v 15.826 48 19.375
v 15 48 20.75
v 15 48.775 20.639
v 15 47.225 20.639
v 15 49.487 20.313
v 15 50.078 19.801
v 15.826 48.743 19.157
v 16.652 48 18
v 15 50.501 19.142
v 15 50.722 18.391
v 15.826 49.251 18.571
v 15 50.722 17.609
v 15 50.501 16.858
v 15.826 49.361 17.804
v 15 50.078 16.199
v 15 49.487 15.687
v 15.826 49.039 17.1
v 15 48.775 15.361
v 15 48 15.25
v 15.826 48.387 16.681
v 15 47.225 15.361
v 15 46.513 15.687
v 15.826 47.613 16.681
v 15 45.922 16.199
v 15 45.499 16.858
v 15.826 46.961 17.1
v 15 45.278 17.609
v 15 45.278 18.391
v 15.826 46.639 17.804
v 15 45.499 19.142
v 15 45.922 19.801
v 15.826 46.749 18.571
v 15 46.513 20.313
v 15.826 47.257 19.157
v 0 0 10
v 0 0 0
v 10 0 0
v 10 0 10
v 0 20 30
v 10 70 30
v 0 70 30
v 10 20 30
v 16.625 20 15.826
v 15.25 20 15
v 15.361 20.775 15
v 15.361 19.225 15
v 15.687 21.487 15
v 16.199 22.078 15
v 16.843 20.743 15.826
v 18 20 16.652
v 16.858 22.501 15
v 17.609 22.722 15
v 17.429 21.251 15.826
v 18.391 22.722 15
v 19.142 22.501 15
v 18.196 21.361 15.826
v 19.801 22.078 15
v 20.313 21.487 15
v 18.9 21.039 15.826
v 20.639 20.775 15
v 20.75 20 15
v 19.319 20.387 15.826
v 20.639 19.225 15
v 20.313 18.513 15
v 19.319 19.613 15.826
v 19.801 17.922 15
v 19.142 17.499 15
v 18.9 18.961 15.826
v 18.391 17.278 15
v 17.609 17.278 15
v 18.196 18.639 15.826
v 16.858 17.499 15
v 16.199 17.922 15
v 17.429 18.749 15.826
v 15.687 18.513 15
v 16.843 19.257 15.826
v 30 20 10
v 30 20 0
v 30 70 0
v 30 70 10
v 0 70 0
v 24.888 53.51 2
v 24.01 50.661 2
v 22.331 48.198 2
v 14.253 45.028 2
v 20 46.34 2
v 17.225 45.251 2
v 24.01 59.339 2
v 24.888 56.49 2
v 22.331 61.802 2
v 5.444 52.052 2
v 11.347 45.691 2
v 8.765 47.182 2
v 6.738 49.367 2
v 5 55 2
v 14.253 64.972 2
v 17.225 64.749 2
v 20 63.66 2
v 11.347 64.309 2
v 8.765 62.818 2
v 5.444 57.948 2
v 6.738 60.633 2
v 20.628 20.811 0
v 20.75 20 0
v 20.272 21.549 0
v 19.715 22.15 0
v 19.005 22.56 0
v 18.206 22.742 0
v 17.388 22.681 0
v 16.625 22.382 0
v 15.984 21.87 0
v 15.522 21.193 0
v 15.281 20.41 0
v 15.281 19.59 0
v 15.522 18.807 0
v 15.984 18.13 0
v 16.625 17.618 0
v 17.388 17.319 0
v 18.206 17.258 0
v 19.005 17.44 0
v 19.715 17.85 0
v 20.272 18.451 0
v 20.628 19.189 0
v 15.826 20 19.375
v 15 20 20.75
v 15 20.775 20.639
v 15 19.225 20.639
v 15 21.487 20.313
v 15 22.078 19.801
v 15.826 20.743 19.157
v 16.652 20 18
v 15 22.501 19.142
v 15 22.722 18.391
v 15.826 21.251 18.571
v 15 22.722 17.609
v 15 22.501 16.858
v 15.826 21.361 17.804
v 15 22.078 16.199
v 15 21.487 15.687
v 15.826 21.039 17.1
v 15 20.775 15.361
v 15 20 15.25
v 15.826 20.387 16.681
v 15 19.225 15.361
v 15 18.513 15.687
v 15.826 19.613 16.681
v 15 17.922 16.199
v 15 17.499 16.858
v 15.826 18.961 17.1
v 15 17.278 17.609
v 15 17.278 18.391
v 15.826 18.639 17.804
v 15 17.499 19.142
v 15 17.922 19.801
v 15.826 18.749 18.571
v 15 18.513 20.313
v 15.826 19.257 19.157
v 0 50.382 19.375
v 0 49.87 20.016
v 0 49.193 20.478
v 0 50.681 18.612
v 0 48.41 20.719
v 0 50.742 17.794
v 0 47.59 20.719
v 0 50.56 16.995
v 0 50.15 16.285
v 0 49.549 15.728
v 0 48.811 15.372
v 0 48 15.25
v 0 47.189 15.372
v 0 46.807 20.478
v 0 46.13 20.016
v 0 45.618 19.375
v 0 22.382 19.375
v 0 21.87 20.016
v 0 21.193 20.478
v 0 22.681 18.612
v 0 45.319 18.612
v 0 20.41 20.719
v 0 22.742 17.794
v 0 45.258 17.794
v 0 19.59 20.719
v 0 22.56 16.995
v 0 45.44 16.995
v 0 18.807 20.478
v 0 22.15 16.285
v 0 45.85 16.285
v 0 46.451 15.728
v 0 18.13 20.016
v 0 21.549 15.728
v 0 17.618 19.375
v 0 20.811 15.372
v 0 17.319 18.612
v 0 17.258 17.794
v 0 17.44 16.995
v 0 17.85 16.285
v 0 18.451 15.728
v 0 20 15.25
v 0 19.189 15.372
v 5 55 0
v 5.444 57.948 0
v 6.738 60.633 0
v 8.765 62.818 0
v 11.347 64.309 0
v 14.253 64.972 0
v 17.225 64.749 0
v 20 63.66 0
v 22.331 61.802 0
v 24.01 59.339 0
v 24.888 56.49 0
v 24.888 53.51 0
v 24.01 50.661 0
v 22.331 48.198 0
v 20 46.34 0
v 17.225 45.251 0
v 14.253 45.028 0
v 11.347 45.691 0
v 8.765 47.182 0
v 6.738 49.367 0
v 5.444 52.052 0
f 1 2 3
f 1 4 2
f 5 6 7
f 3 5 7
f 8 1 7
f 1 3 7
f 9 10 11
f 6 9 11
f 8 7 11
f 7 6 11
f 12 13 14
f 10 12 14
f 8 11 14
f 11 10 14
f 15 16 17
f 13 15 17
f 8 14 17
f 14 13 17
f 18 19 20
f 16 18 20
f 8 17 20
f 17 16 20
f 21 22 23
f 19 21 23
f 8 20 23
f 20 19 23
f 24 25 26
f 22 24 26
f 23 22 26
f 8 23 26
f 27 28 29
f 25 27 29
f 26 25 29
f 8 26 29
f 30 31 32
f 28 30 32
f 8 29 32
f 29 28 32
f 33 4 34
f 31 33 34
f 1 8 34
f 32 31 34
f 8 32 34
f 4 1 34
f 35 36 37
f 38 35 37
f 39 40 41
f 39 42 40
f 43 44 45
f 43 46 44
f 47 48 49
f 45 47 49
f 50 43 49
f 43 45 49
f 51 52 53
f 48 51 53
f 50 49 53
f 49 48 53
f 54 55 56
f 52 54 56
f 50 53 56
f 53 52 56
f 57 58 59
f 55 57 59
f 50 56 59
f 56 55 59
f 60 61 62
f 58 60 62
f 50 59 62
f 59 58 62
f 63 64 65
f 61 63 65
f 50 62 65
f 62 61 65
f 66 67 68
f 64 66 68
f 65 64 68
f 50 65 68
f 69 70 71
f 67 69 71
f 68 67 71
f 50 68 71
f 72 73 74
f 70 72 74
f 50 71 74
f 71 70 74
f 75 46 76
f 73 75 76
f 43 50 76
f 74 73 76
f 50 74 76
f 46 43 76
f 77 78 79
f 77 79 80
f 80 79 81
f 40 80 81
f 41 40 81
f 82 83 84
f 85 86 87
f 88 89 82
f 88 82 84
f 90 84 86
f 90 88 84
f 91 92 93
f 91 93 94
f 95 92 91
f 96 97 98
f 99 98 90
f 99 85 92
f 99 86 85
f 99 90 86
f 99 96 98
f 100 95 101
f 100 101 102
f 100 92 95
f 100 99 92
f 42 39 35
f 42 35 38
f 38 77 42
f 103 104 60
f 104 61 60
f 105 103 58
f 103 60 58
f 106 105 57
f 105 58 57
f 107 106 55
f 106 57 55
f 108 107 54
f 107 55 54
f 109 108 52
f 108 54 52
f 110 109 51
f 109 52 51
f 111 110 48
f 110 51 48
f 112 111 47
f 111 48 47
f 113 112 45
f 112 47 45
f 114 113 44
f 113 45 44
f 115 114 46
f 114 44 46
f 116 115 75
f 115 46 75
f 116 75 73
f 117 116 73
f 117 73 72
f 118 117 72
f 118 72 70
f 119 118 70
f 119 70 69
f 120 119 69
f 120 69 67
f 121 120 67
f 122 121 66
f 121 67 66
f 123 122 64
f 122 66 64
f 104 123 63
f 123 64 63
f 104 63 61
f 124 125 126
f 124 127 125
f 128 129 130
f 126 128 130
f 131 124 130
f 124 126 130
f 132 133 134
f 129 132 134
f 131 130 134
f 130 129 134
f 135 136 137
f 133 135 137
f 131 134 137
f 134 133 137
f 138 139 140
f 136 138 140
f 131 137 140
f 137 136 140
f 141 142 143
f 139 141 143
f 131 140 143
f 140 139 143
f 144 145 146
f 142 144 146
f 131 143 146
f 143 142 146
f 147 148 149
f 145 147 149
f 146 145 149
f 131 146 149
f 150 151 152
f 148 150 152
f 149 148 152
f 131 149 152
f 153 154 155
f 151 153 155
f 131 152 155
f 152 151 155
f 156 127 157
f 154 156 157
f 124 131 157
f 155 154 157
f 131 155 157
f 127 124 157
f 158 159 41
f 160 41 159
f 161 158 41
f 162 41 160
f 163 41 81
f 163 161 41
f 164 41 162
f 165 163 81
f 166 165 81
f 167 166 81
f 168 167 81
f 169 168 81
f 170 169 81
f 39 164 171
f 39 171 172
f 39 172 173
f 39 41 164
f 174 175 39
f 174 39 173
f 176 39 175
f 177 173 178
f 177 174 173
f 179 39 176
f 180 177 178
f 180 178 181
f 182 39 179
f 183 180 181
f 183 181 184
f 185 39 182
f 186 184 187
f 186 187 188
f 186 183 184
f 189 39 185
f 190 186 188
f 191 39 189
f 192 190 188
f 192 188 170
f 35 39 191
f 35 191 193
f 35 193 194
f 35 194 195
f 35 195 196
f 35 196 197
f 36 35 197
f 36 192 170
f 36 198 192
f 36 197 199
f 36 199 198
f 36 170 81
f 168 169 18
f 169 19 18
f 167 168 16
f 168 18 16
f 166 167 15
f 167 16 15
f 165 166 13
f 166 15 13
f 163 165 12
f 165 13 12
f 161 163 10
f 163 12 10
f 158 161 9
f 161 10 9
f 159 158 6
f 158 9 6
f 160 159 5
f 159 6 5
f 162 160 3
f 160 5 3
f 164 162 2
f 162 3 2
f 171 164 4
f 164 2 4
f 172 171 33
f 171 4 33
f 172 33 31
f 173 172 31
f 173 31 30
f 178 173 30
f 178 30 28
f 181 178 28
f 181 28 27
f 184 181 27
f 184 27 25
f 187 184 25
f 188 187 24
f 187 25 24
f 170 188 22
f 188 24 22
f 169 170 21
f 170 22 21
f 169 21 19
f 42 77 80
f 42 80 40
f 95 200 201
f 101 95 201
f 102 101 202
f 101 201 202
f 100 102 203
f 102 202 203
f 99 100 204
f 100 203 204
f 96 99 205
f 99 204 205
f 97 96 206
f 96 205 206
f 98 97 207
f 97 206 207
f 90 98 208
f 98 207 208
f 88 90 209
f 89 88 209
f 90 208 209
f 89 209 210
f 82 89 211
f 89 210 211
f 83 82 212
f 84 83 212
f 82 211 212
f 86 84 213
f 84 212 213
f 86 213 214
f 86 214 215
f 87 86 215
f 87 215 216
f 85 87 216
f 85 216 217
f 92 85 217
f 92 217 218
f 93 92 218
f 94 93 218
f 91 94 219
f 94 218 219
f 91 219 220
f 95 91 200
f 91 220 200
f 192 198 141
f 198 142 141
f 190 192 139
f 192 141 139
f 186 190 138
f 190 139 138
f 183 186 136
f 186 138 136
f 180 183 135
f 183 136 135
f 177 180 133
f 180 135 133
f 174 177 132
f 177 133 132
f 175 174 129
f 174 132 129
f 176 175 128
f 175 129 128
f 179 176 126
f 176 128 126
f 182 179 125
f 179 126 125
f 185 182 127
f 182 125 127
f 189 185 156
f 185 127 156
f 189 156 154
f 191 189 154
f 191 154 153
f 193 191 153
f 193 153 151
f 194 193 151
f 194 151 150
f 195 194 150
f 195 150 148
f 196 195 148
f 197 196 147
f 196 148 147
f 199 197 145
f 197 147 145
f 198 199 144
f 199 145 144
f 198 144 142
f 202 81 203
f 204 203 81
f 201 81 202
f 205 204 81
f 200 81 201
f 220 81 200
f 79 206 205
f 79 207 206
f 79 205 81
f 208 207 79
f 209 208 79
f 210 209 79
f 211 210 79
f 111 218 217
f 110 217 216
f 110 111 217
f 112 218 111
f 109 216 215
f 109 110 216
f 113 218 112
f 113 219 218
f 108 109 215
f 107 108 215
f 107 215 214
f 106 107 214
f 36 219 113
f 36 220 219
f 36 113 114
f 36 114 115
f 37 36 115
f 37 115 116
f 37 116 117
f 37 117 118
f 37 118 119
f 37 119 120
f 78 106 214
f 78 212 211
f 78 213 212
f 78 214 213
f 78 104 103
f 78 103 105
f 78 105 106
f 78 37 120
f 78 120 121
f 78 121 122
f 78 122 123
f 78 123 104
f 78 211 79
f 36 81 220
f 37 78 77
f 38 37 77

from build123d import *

# Parameters (mm, degrees)
SCHIZZO1_W                   = 30
SCHIZZO1_H                   = 40
ESTRUSIONE_ESTRUSIONE1_DEPTH = 30
SMUSSO1_SIZE                 = 20
ESTRUSIONE_ESTRUSIONE2_DEPTH = 30
FORO_PER_VITE_M5_1_D         = 5.5
FORO_PER_VITE_M5_1_DEPTH     = 15
FORO_PER_VITE_M5_1_TIP       = 1.652366702
FORO_PER_VITE_M5_2_D         = 5.5
FORO_PER_VITE_M5_2_DEPTH     = 15
FORO_PER_VITE_M5_2_TIP       = 1.652366702
SCHIZZO6_R                   = 10
TAGLIO_ESTRUSIONE1_DEPTH     = 2


with BuildPart() as part:
    # Schizzo1 → Estrusione-Estrusione1 (new body)
    with BuildSketch(Plane.XY):
        with Locations((15, 20)):
            Rectangle(SCHIZZO1_W, SCHIZZO1_H)
    extrude(amount=ESTRUSIONE_ESTRUSIONE1_DEPTH)

    # Smusso1
    smusso1_edges = [part.edges().sort_by_distance(p)[0] for p in [
        (30, 20, 30),
        (30, 0, 15),
        (15, 0, 30),
    ]]
    chamfer(smusso1_edges, length=SMUSSO1_SIZE)

    # Schizzo2 → Estrusione-Estrusione2 (add)
    with BuildSketch(Plane(origin=(0, 40, 0), x_dir=(1, 0, 0), z_dir=(0, 1, 0))):
        Polygon((0, 0), (30, 0), (30, -10), (10, -30), (0, -30), align=None)
    extrude(amount=ESTRUSIONE_ESTRUSIONE2_DEPTH)

    # Foro per Vite M5-1
    with Locations(Plane.ZY):
        with Locations((18, 20), (18, 48)):
            Hole(FORO_PER_VITE_M5_1_D / 2, depth=FORO_PER_VITE_M5_1_DEPTH)
            with Locations((0, 0, -(FORO_PER_VITE_M5_1_DEPTH + FORO_PER_VITE_M5_1_TIP / 2))):  # 118° drill point
                Cone(0, FORO_PER_VITE_M5_1_D / 2, FORO_PER_VITE_M5_1_TIP, mode=Mode.SUBTRACT)

    # Foro per Vite M5-2
    with Locations(Plane(origin=(18, 20, 0), x_dir=(-1, 0, 0), z_dir=(0, 0, -1))):
        with Locations((0, 0)):
            Hole(FORO_PER_VITE_M5_2_D / 2, depth=FORO_PER_VITE_M5_2_DEPTH)
            with Locations((0, 0, -(FORO_PER_VITE_M5_2_DEPTH + FORO_PER_VITE_M5_2_TIP / 2))):  # 118° drill point
                Cone(0, FORO_PER_VITE_M5_2_D / 2, FORO_PER_VITE_M5_2_TIP, mode=Mode.SUBTRACT)

    # Schizzo6 → Taglio-Estrusione1 (cut)
    with BuildSketch(Plane(origin=(0, 0, 0), x_dir=(-1, 0, 0), z_dir=(0, 0, -1))):
        with Locations((-15, 55)):
            Circle(SCHIZZO6_R)
    extrude(amount=-TAGLIO_ESTRUSIONE1_DEPTH, mode=Mode.SUBTRACT)


solid = part.part
